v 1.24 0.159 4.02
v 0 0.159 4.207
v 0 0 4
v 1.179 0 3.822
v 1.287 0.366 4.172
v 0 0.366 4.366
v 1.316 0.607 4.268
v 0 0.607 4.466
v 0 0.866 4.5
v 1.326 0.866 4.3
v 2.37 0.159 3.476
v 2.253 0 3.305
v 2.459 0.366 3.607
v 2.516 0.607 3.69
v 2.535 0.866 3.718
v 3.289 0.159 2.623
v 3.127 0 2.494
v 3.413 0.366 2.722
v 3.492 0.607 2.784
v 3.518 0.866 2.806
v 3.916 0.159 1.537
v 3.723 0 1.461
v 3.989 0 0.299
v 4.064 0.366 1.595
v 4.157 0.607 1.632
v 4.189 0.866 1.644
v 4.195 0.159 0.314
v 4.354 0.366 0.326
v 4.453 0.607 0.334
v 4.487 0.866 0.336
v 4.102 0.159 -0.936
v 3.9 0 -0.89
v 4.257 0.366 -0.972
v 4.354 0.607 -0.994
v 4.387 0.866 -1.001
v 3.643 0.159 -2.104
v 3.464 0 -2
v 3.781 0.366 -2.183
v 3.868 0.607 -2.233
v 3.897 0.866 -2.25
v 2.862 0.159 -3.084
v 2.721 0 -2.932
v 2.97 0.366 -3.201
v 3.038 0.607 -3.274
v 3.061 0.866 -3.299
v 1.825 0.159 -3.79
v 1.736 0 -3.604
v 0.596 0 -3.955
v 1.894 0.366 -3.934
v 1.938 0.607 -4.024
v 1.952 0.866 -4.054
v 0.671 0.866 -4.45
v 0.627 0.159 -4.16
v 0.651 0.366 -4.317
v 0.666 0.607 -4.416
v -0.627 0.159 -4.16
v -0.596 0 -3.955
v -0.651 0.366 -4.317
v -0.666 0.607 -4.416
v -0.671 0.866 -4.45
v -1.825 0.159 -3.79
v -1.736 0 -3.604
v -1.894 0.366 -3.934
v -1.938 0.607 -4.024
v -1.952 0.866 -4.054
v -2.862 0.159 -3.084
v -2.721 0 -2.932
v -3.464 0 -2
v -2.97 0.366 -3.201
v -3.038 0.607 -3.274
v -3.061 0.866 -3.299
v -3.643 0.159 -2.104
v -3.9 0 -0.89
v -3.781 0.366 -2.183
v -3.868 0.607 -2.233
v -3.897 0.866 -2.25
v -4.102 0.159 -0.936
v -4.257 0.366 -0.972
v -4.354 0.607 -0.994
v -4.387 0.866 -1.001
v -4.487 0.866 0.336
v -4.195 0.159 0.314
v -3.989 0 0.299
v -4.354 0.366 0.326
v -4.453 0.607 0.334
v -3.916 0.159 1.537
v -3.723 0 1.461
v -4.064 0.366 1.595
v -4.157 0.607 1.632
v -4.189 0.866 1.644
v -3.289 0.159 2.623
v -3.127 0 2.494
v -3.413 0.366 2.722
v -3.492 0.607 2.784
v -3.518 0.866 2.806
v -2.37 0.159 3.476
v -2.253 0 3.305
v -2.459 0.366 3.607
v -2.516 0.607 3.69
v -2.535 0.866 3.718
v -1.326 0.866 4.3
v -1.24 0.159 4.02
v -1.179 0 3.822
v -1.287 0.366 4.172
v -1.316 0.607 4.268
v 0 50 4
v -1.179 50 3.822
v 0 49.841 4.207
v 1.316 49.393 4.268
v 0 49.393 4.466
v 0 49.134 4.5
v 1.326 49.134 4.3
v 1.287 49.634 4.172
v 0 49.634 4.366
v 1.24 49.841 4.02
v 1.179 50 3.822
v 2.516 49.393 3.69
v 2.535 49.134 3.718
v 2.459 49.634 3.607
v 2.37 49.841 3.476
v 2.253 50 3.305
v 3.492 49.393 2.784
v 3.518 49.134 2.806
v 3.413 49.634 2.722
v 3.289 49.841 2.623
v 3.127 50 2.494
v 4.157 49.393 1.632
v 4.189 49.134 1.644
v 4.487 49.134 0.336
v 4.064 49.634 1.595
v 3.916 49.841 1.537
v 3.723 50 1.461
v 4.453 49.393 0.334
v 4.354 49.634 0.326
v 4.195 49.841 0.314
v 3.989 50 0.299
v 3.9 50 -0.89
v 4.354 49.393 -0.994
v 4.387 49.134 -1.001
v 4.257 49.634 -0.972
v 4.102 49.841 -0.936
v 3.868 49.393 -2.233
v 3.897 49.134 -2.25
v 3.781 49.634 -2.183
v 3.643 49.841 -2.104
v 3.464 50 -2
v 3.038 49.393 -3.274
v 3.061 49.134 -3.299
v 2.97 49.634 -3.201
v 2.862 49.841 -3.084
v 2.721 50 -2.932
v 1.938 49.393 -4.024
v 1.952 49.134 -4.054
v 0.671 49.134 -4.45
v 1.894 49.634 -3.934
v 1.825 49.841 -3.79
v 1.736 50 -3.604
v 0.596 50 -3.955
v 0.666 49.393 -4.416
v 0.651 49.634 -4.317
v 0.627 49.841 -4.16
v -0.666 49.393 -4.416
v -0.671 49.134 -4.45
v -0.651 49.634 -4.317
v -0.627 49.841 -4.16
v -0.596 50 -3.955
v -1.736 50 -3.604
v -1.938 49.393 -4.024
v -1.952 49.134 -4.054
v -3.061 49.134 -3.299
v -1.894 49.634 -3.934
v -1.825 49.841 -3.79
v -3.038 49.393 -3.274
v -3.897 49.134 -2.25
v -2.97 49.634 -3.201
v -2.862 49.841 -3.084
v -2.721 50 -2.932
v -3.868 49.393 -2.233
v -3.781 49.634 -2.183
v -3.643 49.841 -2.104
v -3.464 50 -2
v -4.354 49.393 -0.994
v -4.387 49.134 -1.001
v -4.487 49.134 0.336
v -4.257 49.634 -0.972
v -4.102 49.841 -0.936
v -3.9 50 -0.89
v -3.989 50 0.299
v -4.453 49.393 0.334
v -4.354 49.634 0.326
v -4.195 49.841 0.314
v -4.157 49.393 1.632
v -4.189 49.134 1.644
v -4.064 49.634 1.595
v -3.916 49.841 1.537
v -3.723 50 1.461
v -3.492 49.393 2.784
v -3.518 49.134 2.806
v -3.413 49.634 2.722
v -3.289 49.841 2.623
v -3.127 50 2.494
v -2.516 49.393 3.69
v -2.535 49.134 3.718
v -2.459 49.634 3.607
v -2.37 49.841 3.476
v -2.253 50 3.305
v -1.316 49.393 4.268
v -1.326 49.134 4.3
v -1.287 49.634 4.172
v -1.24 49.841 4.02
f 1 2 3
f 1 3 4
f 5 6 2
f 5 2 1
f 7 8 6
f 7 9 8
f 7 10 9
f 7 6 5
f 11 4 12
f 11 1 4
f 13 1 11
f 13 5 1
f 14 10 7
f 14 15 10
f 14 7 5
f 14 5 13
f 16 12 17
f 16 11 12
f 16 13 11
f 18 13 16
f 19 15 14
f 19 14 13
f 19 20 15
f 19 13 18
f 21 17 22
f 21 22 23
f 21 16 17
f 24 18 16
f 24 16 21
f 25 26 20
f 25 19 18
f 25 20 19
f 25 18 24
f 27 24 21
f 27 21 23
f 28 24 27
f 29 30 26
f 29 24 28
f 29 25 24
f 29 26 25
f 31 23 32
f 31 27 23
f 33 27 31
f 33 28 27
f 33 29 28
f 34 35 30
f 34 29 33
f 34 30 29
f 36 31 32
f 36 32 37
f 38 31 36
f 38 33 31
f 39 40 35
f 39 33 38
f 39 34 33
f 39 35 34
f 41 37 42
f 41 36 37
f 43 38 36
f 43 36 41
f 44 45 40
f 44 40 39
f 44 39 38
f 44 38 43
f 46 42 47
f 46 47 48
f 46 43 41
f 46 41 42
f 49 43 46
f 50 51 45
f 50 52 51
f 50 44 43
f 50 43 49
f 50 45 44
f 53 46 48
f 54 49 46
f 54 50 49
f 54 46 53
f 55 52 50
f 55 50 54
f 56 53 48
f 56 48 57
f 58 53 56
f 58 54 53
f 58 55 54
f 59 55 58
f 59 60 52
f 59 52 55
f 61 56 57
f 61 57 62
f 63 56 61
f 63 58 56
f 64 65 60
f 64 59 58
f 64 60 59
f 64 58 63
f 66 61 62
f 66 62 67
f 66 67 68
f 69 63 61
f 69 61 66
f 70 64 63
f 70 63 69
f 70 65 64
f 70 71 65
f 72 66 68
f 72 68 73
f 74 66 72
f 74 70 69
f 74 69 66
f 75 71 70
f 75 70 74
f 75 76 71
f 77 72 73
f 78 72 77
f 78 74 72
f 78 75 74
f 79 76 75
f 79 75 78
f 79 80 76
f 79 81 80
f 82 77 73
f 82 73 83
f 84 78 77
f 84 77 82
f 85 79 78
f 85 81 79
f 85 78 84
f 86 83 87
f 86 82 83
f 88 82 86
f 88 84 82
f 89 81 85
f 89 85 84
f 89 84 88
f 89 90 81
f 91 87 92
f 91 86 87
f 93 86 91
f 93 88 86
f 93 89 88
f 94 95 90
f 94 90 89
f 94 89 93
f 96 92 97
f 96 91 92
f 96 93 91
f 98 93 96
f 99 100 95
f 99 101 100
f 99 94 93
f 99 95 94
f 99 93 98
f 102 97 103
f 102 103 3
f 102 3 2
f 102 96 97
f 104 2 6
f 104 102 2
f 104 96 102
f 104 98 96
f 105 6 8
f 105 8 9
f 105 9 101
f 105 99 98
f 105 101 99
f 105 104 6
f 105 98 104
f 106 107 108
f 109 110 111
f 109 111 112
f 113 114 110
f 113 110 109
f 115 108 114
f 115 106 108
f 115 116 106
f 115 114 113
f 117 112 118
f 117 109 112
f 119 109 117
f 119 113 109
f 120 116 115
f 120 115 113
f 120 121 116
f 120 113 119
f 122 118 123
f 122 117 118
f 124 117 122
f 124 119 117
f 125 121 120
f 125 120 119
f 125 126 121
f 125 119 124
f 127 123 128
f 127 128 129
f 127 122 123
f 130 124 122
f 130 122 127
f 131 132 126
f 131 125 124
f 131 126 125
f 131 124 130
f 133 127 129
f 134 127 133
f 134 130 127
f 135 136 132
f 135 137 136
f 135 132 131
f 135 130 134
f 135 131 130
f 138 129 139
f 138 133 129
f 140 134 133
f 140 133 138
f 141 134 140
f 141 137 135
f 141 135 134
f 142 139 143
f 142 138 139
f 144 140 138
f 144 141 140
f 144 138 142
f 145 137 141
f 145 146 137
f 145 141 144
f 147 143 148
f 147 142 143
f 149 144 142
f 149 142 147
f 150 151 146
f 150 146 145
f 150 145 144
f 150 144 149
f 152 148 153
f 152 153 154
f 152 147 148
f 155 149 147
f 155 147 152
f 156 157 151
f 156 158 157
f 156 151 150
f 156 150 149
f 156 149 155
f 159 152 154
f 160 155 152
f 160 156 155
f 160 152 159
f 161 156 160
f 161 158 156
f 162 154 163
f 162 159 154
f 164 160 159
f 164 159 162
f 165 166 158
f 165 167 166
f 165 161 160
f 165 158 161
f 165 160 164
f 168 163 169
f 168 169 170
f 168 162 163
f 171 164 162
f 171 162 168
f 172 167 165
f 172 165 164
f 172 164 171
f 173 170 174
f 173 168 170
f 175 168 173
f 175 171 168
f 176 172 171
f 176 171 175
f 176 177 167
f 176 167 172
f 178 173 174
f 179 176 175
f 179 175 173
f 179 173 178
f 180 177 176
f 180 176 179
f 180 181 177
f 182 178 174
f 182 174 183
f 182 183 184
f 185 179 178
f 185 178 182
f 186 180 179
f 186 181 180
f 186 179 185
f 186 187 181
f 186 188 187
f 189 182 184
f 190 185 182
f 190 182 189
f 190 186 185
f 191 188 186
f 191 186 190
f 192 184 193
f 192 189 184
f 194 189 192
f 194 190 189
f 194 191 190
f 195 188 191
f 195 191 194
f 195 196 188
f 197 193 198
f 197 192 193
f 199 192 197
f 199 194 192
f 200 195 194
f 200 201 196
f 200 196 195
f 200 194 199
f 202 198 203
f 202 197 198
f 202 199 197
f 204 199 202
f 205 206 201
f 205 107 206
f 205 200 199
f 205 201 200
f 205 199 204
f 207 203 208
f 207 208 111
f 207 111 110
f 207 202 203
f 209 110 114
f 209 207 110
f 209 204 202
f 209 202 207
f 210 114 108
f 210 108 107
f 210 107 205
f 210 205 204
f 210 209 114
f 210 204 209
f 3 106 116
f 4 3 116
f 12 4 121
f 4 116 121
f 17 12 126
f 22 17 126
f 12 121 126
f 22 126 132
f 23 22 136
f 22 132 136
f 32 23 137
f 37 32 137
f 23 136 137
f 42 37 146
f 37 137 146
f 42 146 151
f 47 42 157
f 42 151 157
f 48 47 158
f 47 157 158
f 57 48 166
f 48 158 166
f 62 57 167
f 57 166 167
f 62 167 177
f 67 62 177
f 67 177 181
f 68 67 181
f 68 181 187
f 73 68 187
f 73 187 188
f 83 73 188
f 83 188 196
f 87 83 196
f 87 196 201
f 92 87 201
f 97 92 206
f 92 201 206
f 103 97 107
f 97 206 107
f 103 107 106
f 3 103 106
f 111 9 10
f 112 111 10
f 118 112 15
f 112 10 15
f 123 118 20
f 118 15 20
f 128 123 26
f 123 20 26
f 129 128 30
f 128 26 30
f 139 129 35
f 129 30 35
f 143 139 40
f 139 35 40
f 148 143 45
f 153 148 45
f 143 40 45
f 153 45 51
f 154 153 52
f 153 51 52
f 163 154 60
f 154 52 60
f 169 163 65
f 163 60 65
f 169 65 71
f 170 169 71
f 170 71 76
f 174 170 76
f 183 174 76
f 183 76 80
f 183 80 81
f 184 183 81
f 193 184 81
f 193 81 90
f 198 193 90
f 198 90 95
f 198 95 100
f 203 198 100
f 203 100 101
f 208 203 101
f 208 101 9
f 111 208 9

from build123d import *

# Parameters (mm, degrees)
SKETCH1_R           = 4.5
BOSS_EXTRUDE1_DEPTH = 50
SKETCH2_R           = 4
CUT_EXTRUDE1_DEPTH  = 50
FILLET2_R           = 1


with BuildPart() as part:
    # Sketch1 → Boss-Extrude1 (new body)
    with BuildSketch(Plane(origin=(0, 0, 0), x_dir=(1, 0, 0), z_dir=(0, 1, 0))):
        with Locations(Location((0, 0, 0), (0, 0, 270))):
            Circle(SKETCH1_R)
    extrude(amount=BOSS_EXTRUDE1_DEPTH)

    # Sketch2 → Cut-Extrude1 (cut)
    with BuildSketch(Plane(origin=(0, 50, 0), x_dir=(1, 0, 0), z_dir=(0, 1, 0))):
        with Locations(Location((0, 0, 0), (0, 0, 270))):
            Circle(SKETCH2_R)
    extrude(amount=-CUT_EXTRUDE1_DEPTH, mode=Mode.SUBTRACT)

    # Fillet2
    # the kernel refuses this fillet: 1 mm, written as the material it takes off along each edge
    with BuildSketch(Plane(origin=(0, 0, 0), x_dir=(0, 0, 1), z_dir=(-1, 0, 0))) as fillet2_piece_1:
        with BuildLine():
            CenterArc((3.5, 0.866025404), FILLET2_R, 300, 60)
            Line((4, 0), (4.01, -0.017320508))
            ThreePointArc((4.01, -0.017320508), (4.25, -0.02), (4.5, -0.02))
            Line((4.5, -0.02), (4.52, 0))
            Line((4.52, 0), (4.52, 0.866025404))
            Line((4.52, 0.866025404), (4.5, 0.866025404))
        make_face()
    revolve(axis=Axis((0, 0, 0), (0, 1, 0)), mode=Mode.SUBTRACT)
    with BuildSketch(Plane(origin=(0, 50, 0), x_dir=(0, 0, 1), z_dir=(-1, 0, 0))) as fillet2_piece_2:
        with BuildLine():
            CenterArc((3.5, -0.866025404), FILLET2_R, 0, 60)
            Line((4, 0), (4.01, 0.017320508))
            ThreePointArc((4.01, 0.017320508), (4.25, 0.02), (4.5, 0.02))
            Line((4.5, 0.02), (4.52, 0))
            Line((4.52, 0), (4.52, -0.866025404))
            Line((4.52, -0.866025404), (4.5, -0.866025404))
        make_face()
    revolve(axis=Axis((0, 50, 0), (0, 1, 0)), mode=Mode.SUBTRACT)


solid = part.part
